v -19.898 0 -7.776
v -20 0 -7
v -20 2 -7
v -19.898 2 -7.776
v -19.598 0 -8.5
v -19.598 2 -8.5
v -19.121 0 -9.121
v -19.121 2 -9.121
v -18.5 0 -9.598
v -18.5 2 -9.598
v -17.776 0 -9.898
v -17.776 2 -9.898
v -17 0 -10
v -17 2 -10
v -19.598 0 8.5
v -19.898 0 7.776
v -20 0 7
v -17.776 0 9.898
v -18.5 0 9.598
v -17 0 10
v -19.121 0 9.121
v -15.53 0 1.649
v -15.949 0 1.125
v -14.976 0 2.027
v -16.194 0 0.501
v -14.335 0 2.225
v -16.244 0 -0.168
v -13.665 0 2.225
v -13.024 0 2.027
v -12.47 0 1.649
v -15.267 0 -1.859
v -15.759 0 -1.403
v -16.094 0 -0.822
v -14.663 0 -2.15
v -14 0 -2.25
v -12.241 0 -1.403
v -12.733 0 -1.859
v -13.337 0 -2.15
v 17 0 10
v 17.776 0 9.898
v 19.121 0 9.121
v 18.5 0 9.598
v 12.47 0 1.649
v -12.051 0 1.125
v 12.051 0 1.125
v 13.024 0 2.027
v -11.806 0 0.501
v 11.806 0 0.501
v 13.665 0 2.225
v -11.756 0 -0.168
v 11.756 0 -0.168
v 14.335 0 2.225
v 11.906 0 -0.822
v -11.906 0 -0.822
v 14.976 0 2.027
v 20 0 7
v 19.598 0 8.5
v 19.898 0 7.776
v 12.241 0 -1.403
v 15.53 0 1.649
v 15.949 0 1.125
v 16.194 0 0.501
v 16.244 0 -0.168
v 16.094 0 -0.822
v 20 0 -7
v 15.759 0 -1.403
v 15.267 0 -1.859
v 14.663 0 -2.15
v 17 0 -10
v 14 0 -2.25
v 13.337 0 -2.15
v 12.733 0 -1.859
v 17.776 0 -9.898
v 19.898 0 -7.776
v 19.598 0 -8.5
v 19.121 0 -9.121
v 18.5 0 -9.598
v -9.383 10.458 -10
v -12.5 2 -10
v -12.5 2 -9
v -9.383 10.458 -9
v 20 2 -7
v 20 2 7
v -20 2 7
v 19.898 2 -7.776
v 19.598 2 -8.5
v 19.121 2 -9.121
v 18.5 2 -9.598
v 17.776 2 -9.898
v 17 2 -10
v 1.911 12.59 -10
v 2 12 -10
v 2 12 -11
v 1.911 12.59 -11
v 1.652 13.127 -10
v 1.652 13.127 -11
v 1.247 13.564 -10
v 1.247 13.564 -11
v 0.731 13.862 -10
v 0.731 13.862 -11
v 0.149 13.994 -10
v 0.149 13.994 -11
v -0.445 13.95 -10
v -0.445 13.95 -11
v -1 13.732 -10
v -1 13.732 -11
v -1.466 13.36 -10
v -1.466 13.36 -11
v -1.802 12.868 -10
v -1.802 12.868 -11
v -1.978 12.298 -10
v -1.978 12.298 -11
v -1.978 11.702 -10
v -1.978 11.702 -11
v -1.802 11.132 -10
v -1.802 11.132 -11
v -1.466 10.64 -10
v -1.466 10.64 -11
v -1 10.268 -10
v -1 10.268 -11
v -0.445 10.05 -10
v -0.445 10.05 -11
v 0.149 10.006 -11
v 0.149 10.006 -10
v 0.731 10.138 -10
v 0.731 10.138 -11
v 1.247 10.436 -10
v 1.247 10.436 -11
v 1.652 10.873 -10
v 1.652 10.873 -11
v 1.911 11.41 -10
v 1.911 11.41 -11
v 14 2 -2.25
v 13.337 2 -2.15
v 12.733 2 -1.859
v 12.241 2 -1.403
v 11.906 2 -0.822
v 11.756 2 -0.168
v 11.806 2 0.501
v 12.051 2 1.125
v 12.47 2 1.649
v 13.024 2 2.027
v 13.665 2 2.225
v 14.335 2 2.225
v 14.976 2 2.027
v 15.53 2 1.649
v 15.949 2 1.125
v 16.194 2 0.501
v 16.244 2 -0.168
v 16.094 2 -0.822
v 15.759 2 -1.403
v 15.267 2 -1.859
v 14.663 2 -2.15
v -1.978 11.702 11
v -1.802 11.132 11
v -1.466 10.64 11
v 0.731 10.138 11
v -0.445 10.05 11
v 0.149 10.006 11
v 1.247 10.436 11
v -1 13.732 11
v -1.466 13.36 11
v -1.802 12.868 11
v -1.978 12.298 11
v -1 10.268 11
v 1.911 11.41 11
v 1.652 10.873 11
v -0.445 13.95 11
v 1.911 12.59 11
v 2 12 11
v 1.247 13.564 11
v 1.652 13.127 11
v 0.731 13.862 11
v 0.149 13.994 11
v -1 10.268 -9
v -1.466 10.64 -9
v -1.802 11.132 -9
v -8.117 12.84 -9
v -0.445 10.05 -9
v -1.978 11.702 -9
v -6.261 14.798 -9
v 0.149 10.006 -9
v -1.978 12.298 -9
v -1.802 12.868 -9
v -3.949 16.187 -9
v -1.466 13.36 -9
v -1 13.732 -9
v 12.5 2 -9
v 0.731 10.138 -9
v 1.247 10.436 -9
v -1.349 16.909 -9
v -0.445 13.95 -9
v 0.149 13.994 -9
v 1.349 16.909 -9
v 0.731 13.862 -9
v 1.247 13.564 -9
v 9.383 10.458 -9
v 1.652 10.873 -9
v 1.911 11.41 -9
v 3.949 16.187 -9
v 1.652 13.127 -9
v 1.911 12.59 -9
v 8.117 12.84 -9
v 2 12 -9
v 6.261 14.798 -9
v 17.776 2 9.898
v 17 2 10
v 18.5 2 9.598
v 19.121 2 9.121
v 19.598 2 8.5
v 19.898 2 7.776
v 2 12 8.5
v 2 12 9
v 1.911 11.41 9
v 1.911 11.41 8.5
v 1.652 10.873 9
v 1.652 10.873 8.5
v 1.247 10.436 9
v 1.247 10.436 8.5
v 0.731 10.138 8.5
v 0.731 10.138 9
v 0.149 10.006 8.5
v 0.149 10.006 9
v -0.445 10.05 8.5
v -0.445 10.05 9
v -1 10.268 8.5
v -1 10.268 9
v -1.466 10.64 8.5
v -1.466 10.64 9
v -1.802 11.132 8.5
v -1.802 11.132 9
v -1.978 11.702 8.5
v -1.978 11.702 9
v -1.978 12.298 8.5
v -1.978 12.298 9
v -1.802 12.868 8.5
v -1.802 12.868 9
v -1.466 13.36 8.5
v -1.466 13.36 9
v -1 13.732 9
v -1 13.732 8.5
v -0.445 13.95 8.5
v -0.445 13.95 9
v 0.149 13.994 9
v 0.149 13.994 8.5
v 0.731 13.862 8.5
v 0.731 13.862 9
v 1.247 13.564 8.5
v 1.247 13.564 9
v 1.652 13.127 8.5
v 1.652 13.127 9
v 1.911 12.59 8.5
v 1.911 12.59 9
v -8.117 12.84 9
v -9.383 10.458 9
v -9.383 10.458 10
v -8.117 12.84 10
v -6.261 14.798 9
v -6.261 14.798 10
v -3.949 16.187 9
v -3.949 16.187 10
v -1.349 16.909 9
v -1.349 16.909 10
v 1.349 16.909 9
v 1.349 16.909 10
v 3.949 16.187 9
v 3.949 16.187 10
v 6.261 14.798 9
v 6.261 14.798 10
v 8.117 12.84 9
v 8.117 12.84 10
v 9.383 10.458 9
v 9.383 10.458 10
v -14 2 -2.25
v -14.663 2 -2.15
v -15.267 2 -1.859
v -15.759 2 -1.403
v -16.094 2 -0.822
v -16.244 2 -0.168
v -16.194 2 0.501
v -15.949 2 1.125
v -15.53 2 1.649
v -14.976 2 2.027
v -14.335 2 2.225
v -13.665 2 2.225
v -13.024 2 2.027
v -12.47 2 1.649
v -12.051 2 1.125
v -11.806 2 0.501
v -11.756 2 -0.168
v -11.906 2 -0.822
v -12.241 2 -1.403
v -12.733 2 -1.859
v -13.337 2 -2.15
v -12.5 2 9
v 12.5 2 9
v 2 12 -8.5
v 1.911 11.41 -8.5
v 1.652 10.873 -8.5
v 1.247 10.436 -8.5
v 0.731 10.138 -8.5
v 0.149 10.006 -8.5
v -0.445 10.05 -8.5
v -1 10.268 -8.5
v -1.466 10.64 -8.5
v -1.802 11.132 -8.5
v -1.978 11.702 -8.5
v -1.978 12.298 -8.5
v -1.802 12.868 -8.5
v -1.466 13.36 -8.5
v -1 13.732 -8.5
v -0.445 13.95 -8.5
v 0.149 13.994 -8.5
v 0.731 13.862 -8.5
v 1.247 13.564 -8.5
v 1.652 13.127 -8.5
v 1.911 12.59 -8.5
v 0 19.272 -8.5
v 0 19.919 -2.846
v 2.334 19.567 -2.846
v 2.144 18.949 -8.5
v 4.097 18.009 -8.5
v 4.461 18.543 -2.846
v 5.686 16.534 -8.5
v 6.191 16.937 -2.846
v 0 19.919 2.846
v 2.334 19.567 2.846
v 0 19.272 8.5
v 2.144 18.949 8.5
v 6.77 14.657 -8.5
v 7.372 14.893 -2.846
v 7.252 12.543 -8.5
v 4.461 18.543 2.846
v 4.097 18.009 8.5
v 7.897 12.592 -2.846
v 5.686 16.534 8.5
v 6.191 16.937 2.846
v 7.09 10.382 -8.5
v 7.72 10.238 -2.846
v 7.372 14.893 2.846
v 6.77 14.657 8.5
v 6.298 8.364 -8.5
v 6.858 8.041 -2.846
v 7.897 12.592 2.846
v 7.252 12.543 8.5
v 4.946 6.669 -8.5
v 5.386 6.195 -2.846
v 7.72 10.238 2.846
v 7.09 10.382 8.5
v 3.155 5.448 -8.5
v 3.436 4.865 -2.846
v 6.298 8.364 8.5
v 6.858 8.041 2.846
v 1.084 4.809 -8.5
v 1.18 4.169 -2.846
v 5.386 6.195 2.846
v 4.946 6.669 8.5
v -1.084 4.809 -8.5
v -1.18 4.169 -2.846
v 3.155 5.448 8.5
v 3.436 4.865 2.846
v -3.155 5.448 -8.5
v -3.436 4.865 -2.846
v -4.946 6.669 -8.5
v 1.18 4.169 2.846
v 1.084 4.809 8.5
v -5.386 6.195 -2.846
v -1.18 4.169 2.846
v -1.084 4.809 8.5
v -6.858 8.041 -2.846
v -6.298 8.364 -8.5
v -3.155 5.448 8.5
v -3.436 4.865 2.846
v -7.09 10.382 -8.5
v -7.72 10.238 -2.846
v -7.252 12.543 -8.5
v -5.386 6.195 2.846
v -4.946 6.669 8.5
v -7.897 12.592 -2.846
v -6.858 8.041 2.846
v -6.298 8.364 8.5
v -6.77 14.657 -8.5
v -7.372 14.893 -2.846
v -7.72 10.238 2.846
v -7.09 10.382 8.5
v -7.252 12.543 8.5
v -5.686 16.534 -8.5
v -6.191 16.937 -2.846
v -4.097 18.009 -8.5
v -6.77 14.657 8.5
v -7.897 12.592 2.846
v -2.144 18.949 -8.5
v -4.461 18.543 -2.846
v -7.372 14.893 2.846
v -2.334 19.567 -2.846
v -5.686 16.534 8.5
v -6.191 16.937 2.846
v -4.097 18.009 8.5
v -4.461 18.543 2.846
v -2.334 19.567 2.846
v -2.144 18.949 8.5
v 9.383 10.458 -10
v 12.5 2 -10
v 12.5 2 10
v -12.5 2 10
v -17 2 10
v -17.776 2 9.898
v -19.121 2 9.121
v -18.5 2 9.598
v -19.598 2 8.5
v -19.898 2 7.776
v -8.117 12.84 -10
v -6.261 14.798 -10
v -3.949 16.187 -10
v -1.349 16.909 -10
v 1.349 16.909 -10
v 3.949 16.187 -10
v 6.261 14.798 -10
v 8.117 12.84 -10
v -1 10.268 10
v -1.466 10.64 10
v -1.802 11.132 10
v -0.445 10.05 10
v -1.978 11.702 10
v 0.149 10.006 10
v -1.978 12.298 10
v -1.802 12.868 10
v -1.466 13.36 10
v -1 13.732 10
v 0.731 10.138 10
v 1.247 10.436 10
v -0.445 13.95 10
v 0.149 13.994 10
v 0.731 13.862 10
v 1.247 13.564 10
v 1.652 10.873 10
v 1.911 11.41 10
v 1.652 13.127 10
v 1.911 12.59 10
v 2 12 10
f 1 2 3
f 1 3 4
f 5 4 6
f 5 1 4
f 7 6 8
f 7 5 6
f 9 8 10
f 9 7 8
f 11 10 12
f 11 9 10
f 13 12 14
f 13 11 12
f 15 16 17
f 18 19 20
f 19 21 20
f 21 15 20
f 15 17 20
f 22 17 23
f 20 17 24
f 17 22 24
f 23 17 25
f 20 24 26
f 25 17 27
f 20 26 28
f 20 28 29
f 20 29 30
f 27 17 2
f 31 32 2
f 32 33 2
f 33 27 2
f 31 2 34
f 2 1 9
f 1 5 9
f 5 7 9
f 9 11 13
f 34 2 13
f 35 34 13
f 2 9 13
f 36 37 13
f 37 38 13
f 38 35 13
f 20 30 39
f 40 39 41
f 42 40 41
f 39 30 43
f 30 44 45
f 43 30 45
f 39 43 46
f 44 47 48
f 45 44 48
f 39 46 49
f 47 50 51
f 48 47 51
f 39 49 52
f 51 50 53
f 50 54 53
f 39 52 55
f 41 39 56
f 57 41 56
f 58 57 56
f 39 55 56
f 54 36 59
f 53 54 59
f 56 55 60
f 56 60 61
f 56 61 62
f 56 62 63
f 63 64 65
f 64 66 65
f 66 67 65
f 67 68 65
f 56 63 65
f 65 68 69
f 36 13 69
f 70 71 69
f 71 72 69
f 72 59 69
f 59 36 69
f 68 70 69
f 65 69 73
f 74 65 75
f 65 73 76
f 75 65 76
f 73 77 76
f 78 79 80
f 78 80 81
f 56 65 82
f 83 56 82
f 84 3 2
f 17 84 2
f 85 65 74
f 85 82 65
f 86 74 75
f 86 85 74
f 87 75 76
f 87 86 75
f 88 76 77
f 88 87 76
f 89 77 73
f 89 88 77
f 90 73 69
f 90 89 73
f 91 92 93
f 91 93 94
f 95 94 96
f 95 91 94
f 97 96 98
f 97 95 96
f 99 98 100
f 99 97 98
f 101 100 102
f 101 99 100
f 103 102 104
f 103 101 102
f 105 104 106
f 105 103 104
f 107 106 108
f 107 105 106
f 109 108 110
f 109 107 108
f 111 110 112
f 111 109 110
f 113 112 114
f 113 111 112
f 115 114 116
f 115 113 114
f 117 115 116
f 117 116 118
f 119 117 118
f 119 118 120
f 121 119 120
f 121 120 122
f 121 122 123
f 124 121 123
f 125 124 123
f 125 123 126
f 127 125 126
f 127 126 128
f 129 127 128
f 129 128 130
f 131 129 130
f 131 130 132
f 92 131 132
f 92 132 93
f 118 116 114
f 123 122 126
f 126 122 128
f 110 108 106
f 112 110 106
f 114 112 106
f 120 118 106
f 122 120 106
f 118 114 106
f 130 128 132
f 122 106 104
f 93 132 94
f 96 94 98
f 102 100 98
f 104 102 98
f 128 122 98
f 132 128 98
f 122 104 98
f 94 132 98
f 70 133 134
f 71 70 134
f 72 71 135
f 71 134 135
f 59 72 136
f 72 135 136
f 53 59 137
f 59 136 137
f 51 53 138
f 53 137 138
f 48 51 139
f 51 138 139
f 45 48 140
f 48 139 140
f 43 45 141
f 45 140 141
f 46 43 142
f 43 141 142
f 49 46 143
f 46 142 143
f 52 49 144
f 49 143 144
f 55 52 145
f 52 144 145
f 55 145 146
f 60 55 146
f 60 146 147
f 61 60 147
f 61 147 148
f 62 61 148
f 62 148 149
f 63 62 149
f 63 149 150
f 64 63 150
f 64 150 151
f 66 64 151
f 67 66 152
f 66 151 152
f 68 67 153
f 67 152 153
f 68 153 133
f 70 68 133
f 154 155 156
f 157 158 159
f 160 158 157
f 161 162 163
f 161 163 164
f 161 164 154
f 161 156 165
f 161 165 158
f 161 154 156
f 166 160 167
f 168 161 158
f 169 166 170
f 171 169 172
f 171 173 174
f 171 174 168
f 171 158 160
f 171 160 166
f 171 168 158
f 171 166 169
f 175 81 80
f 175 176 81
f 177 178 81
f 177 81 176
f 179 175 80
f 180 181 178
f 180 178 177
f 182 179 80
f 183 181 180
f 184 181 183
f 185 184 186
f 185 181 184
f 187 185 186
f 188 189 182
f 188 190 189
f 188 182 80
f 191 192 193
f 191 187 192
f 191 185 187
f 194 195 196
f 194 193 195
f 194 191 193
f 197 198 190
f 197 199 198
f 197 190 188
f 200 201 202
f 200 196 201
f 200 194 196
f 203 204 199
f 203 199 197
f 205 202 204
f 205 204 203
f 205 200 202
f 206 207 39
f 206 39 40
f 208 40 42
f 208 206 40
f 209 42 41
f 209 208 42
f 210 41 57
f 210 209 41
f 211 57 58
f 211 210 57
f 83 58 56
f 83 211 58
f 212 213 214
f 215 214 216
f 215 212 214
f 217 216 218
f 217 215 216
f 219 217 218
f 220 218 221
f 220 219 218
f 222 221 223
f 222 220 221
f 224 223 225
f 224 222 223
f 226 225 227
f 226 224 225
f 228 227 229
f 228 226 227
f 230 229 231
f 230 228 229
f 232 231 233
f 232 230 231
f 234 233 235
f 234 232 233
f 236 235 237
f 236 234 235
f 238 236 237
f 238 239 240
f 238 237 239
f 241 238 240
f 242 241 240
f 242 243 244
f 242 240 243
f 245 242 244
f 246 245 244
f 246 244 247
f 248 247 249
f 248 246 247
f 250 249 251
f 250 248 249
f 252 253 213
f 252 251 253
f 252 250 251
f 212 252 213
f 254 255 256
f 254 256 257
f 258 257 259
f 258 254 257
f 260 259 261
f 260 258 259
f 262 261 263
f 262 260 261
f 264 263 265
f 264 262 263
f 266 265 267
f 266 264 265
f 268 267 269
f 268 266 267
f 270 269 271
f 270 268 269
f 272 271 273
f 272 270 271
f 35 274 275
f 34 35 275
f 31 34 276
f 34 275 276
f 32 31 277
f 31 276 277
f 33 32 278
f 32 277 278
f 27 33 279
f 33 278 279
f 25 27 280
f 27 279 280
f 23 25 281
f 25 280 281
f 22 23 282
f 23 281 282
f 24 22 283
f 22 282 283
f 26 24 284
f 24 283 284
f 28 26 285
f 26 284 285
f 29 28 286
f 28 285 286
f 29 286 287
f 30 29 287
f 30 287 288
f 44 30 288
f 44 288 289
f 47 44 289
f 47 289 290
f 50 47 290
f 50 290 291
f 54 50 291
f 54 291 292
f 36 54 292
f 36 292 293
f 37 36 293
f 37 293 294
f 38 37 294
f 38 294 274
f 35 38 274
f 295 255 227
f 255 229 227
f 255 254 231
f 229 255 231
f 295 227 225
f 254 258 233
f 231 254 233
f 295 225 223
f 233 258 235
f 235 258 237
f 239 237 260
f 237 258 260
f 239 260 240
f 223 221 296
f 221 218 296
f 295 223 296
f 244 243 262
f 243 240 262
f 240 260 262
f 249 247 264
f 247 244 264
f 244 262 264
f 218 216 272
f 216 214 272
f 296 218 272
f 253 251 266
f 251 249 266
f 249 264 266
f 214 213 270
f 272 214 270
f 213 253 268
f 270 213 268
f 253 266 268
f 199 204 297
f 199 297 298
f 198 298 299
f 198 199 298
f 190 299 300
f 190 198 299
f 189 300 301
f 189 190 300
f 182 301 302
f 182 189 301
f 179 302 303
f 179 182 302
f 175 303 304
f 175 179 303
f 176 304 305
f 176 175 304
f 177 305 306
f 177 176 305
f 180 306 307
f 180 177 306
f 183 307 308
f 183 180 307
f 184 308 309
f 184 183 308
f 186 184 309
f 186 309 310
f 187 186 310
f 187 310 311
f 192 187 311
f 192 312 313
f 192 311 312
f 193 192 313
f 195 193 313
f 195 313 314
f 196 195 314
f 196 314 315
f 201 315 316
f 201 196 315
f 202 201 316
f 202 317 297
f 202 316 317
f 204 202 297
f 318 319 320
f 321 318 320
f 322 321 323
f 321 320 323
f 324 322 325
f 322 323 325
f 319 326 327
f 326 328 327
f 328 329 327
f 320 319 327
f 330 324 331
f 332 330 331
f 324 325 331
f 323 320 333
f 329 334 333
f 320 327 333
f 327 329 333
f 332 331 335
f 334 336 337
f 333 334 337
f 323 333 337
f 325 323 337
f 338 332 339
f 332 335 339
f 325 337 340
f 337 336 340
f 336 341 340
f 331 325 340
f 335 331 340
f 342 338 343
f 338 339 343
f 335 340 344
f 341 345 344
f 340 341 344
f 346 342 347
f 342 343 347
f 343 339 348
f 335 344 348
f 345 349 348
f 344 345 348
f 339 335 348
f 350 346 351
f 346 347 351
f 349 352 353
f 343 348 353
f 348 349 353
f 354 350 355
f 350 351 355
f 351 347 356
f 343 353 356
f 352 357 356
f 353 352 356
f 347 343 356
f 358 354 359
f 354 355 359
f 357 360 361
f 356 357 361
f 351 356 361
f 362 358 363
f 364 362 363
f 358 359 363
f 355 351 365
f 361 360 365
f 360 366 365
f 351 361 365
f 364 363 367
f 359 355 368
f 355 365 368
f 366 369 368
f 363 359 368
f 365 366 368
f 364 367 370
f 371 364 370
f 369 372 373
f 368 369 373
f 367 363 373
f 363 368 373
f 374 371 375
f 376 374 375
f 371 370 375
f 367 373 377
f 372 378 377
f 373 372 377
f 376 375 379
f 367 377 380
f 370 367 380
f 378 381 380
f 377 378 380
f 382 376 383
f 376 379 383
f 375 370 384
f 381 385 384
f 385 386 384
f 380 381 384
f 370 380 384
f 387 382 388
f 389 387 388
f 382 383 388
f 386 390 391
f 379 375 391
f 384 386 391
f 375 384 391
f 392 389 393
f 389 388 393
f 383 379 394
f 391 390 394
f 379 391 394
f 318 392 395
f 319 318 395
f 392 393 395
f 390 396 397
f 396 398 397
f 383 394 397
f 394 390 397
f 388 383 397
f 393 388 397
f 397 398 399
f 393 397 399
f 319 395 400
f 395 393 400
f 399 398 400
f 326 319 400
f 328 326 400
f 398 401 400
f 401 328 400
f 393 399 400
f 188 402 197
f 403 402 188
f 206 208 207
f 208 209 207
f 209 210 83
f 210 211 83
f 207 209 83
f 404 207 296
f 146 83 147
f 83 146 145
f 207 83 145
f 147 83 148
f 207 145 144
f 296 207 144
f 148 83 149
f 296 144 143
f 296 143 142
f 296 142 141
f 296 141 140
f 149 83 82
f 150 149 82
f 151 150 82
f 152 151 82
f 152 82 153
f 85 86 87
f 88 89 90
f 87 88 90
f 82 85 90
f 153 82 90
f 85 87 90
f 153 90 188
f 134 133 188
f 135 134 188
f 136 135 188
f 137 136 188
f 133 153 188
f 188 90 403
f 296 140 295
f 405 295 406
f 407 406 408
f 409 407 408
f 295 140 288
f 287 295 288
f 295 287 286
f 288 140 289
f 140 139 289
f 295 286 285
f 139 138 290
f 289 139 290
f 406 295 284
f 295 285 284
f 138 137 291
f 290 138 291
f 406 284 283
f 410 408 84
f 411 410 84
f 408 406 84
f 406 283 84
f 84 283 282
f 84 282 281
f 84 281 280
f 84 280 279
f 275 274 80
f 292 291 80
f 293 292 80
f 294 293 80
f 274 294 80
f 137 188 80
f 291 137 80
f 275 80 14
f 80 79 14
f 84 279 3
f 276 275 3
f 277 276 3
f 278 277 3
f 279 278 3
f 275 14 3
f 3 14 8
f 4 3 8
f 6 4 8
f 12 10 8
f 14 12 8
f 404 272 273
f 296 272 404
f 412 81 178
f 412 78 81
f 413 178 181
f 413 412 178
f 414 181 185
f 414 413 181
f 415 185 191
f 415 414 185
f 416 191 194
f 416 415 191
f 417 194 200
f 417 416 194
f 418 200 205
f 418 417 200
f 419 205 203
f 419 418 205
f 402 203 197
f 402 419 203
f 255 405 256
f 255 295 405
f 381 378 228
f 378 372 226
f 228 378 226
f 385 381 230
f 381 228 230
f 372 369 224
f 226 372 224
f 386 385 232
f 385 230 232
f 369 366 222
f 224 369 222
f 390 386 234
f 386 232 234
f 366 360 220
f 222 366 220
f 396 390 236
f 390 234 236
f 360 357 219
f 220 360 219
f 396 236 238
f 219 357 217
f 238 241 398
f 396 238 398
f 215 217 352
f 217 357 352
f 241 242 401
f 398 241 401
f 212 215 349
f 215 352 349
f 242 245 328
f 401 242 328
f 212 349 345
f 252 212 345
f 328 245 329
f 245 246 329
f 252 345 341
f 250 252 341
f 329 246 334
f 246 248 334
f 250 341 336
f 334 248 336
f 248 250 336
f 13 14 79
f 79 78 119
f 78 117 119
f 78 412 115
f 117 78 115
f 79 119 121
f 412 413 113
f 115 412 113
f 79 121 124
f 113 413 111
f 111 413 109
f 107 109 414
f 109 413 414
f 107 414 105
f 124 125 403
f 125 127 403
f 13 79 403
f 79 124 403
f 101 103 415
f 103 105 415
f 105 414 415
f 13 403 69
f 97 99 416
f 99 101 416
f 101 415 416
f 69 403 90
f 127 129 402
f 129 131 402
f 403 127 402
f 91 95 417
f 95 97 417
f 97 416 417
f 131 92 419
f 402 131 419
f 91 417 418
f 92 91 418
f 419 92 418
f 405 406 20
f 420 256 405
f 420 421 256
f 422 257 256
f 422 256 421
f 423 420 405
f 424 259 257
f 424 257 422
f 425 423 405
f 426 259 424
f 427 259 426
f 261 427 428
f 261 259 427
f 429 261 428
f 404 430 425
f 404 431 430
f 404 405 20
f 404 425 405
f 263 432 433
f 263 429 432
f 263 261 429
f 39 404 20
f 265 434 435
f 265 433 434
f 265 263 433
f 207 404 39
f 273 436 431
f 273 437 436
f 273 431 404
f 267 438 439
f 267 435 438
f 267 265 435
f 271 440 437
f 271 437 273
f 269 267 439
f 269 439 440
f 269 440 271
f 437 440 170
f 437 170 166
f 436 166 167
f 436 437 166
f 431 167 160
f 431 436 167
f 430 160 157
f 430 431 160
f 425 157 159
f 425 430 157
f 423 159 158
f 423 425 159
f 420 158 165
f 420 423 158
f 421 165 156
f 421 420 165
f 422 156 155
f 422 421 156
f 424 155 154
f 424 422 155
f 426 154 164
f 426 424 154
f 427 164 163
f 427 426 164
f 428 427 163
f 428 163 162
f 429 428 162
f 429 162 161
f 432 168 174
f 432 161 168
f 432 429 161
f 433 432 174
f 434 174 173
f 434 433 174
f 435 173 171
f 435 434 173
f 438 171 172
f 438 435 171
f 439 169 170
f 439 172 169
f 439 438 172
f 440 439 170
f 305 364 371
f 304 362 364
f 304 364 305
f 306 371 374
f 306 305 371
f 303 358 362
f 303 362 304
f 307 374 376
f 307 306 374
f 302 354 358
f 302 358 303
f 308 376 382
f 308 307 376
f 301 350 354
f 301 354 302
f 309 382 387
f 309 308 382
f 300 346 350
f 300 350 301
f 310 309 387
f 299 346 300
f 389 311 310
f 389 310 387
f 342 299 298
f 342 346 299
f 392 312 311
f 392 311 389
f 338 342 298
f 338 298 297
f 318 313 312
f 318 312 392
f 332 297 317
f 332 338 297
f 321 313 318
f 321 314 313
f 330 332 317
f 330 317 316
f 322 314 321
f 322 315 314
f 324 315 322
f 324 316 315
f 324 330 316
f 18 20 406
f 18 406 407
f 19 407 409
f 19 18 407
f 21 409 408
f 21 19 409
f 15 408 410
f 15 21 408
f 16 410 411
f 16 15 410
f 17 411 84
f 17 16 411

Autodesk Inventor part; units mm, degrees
ref_plane "YZ Plane" through (0, 0, 0) normal (1, 0, 0) x (0, 1, 0)
ref_plane "XZ Plane" through (0, 0, 0) normal (0, 1, 0) x (-1, 0, 0)
ref_plane "XY Plane" through (0, 0, 0) normal (0, 0, 1) x (1, 0, 0)
sketch "Sketch1" plane through (0, 0, 0) normal (0, 0, 1) x (1, 0, 0)
  line L0 (-20, 0) -> (20, 0)
  line L1 (20, 0) -> (20, 2)
  line L2 (20, 2) -> (-20, 2)
  line L3 (-20, 2) -> (-20, 0)
  line L4 (-12.5, 2) -> (-9.3831, 10.4578)
  line L5 (9.3831, 10.4578) -> (12.5, 2)
  line L6 (0, 12) -> (0, 2) construction
  circle A0 centre (0, 12) radius 2
  arc A1 (9.3831, 10.4578) -> (-9.3831, 10.4578) centre (0, 7) ccw
  point P0 (0, 0)
  point P1 (0, 0)
  dimension "d0" = 40
  dimension "d1" = 2
  dimension "d2" = 25
  dimension "d3" = 12
  dimension "d5" = 4
  dimension "d27" = 10
  dimension "d28" = 5
extrude "Extrusion1" add sketch "Sketch1" along normal mid plane 20
extrude "Extrusion3" add sketch "Sketch1" along normal mid plane 22 contours A0
extrude "Extrusion2" cut sketch "Sketch1" along normal mid plane 18 contours L4 A1 L5 L2
sketch "Sketch2" plane through (0, 0, 0) normal (1, 0, 0) x (0, 1, 0)
  line L0 (14, -11) -> (10, -11) projected
  line L1 (10, -10) -> (0, -10) projected
  line L2 (0, -10) -> (0, 10) projected
  line L3 (0, 10) -> (10, 10) projected
  line L4 (10, 11) -> (14, 11) projected
  line L5 (12, 11) -> (12, -11)
  line L6 (14, 8.5) -> (14, -8.5)
  line L7 (14, -8.5) -> (19.2722, -8.5)
  line L8 (14, 8.5) -> (19.2722, 8.5)
  arc A0 (19.2722, -8.5) -> (19.2722, 8.5) centre (-30, 0) ccw
  line L9 (12, 0) -> (2, 0) construction
  line L10 (20, 8.5) -> (20, -8.5) construction
  line L11 (19.2722, 8.5) -> (20, 8.5) construction
  line L12 (20, -8.5) -> (19.2722, -8.5) construction
  line L13 (10, -9) -> (10, 9) projected
  line L14 (10, 9) -> (2, 9) projected
  line L15 (2, 9) -> (2, -9) projected
  line L16 (2, -9) -> (10, -9) projected
  line L17 (14, -10) -> (14, -11) projected
  line L18 (10, -11) -> (10, -10) projected
  line L19 (10, 10) -> (10, 11) projected
  line L20 (14, 11) -> (14, 10) projected
  line L21 (14, 10) -> (17, 10) projected
  line L22 (17, 10) -> (17, 9) projected
  line L23 (17, 9) -> (14, 9) projected
  line L24 (14, 9) -> (14, -9) projected
  line L25 (14, -9) -> (17, -9) projected
  line L26 (17, -9) -> (17, -10) projected
  line L27 (17, -10) -> (14, -10) projected
  point P0 (0, 0)
  dimension "d14" = 8
  dimension "d15" = 50
  dimension "d29" = 17
revolve "Revolution1" add sketch "Sketch2" angle 360 about axis through (0, 12, 11) along (0, 0, -1) contours L6 L8 A0 L7
fillet "Fillet1" radius 3 4 edges at (-20, 1, -10) (-20, 1, 10) (20, 1, 10) (20, 1, -10)
sketch "Sketch3" plane through (-17, 0, 10) normal (0, -1, 0) x (1, 0, 0)
  line L0 (37, -17) -> (37, -3) projected
  line L1 (0, 0) -> (34, 0) projected
  line L2 (-3, -3) -> (-3, -17) projected
  line L3 (34, -20) -> (0, -20) projected
  line L4 (-3, -10) -> (37, -10) construction
  line L5 (17, 0) -> (17, -20) construction
  point P0 (17, -10)
  point P1 (3, -10)
  point P2 (31, -10)
  dimension "d18" = 28
hole "Hole1" at (-14, 0, 0) at (14, 0, 0) direction (0, 1, 0) diameter 4.5 end through all
properties part number "rolka_meblowa_16mm"
